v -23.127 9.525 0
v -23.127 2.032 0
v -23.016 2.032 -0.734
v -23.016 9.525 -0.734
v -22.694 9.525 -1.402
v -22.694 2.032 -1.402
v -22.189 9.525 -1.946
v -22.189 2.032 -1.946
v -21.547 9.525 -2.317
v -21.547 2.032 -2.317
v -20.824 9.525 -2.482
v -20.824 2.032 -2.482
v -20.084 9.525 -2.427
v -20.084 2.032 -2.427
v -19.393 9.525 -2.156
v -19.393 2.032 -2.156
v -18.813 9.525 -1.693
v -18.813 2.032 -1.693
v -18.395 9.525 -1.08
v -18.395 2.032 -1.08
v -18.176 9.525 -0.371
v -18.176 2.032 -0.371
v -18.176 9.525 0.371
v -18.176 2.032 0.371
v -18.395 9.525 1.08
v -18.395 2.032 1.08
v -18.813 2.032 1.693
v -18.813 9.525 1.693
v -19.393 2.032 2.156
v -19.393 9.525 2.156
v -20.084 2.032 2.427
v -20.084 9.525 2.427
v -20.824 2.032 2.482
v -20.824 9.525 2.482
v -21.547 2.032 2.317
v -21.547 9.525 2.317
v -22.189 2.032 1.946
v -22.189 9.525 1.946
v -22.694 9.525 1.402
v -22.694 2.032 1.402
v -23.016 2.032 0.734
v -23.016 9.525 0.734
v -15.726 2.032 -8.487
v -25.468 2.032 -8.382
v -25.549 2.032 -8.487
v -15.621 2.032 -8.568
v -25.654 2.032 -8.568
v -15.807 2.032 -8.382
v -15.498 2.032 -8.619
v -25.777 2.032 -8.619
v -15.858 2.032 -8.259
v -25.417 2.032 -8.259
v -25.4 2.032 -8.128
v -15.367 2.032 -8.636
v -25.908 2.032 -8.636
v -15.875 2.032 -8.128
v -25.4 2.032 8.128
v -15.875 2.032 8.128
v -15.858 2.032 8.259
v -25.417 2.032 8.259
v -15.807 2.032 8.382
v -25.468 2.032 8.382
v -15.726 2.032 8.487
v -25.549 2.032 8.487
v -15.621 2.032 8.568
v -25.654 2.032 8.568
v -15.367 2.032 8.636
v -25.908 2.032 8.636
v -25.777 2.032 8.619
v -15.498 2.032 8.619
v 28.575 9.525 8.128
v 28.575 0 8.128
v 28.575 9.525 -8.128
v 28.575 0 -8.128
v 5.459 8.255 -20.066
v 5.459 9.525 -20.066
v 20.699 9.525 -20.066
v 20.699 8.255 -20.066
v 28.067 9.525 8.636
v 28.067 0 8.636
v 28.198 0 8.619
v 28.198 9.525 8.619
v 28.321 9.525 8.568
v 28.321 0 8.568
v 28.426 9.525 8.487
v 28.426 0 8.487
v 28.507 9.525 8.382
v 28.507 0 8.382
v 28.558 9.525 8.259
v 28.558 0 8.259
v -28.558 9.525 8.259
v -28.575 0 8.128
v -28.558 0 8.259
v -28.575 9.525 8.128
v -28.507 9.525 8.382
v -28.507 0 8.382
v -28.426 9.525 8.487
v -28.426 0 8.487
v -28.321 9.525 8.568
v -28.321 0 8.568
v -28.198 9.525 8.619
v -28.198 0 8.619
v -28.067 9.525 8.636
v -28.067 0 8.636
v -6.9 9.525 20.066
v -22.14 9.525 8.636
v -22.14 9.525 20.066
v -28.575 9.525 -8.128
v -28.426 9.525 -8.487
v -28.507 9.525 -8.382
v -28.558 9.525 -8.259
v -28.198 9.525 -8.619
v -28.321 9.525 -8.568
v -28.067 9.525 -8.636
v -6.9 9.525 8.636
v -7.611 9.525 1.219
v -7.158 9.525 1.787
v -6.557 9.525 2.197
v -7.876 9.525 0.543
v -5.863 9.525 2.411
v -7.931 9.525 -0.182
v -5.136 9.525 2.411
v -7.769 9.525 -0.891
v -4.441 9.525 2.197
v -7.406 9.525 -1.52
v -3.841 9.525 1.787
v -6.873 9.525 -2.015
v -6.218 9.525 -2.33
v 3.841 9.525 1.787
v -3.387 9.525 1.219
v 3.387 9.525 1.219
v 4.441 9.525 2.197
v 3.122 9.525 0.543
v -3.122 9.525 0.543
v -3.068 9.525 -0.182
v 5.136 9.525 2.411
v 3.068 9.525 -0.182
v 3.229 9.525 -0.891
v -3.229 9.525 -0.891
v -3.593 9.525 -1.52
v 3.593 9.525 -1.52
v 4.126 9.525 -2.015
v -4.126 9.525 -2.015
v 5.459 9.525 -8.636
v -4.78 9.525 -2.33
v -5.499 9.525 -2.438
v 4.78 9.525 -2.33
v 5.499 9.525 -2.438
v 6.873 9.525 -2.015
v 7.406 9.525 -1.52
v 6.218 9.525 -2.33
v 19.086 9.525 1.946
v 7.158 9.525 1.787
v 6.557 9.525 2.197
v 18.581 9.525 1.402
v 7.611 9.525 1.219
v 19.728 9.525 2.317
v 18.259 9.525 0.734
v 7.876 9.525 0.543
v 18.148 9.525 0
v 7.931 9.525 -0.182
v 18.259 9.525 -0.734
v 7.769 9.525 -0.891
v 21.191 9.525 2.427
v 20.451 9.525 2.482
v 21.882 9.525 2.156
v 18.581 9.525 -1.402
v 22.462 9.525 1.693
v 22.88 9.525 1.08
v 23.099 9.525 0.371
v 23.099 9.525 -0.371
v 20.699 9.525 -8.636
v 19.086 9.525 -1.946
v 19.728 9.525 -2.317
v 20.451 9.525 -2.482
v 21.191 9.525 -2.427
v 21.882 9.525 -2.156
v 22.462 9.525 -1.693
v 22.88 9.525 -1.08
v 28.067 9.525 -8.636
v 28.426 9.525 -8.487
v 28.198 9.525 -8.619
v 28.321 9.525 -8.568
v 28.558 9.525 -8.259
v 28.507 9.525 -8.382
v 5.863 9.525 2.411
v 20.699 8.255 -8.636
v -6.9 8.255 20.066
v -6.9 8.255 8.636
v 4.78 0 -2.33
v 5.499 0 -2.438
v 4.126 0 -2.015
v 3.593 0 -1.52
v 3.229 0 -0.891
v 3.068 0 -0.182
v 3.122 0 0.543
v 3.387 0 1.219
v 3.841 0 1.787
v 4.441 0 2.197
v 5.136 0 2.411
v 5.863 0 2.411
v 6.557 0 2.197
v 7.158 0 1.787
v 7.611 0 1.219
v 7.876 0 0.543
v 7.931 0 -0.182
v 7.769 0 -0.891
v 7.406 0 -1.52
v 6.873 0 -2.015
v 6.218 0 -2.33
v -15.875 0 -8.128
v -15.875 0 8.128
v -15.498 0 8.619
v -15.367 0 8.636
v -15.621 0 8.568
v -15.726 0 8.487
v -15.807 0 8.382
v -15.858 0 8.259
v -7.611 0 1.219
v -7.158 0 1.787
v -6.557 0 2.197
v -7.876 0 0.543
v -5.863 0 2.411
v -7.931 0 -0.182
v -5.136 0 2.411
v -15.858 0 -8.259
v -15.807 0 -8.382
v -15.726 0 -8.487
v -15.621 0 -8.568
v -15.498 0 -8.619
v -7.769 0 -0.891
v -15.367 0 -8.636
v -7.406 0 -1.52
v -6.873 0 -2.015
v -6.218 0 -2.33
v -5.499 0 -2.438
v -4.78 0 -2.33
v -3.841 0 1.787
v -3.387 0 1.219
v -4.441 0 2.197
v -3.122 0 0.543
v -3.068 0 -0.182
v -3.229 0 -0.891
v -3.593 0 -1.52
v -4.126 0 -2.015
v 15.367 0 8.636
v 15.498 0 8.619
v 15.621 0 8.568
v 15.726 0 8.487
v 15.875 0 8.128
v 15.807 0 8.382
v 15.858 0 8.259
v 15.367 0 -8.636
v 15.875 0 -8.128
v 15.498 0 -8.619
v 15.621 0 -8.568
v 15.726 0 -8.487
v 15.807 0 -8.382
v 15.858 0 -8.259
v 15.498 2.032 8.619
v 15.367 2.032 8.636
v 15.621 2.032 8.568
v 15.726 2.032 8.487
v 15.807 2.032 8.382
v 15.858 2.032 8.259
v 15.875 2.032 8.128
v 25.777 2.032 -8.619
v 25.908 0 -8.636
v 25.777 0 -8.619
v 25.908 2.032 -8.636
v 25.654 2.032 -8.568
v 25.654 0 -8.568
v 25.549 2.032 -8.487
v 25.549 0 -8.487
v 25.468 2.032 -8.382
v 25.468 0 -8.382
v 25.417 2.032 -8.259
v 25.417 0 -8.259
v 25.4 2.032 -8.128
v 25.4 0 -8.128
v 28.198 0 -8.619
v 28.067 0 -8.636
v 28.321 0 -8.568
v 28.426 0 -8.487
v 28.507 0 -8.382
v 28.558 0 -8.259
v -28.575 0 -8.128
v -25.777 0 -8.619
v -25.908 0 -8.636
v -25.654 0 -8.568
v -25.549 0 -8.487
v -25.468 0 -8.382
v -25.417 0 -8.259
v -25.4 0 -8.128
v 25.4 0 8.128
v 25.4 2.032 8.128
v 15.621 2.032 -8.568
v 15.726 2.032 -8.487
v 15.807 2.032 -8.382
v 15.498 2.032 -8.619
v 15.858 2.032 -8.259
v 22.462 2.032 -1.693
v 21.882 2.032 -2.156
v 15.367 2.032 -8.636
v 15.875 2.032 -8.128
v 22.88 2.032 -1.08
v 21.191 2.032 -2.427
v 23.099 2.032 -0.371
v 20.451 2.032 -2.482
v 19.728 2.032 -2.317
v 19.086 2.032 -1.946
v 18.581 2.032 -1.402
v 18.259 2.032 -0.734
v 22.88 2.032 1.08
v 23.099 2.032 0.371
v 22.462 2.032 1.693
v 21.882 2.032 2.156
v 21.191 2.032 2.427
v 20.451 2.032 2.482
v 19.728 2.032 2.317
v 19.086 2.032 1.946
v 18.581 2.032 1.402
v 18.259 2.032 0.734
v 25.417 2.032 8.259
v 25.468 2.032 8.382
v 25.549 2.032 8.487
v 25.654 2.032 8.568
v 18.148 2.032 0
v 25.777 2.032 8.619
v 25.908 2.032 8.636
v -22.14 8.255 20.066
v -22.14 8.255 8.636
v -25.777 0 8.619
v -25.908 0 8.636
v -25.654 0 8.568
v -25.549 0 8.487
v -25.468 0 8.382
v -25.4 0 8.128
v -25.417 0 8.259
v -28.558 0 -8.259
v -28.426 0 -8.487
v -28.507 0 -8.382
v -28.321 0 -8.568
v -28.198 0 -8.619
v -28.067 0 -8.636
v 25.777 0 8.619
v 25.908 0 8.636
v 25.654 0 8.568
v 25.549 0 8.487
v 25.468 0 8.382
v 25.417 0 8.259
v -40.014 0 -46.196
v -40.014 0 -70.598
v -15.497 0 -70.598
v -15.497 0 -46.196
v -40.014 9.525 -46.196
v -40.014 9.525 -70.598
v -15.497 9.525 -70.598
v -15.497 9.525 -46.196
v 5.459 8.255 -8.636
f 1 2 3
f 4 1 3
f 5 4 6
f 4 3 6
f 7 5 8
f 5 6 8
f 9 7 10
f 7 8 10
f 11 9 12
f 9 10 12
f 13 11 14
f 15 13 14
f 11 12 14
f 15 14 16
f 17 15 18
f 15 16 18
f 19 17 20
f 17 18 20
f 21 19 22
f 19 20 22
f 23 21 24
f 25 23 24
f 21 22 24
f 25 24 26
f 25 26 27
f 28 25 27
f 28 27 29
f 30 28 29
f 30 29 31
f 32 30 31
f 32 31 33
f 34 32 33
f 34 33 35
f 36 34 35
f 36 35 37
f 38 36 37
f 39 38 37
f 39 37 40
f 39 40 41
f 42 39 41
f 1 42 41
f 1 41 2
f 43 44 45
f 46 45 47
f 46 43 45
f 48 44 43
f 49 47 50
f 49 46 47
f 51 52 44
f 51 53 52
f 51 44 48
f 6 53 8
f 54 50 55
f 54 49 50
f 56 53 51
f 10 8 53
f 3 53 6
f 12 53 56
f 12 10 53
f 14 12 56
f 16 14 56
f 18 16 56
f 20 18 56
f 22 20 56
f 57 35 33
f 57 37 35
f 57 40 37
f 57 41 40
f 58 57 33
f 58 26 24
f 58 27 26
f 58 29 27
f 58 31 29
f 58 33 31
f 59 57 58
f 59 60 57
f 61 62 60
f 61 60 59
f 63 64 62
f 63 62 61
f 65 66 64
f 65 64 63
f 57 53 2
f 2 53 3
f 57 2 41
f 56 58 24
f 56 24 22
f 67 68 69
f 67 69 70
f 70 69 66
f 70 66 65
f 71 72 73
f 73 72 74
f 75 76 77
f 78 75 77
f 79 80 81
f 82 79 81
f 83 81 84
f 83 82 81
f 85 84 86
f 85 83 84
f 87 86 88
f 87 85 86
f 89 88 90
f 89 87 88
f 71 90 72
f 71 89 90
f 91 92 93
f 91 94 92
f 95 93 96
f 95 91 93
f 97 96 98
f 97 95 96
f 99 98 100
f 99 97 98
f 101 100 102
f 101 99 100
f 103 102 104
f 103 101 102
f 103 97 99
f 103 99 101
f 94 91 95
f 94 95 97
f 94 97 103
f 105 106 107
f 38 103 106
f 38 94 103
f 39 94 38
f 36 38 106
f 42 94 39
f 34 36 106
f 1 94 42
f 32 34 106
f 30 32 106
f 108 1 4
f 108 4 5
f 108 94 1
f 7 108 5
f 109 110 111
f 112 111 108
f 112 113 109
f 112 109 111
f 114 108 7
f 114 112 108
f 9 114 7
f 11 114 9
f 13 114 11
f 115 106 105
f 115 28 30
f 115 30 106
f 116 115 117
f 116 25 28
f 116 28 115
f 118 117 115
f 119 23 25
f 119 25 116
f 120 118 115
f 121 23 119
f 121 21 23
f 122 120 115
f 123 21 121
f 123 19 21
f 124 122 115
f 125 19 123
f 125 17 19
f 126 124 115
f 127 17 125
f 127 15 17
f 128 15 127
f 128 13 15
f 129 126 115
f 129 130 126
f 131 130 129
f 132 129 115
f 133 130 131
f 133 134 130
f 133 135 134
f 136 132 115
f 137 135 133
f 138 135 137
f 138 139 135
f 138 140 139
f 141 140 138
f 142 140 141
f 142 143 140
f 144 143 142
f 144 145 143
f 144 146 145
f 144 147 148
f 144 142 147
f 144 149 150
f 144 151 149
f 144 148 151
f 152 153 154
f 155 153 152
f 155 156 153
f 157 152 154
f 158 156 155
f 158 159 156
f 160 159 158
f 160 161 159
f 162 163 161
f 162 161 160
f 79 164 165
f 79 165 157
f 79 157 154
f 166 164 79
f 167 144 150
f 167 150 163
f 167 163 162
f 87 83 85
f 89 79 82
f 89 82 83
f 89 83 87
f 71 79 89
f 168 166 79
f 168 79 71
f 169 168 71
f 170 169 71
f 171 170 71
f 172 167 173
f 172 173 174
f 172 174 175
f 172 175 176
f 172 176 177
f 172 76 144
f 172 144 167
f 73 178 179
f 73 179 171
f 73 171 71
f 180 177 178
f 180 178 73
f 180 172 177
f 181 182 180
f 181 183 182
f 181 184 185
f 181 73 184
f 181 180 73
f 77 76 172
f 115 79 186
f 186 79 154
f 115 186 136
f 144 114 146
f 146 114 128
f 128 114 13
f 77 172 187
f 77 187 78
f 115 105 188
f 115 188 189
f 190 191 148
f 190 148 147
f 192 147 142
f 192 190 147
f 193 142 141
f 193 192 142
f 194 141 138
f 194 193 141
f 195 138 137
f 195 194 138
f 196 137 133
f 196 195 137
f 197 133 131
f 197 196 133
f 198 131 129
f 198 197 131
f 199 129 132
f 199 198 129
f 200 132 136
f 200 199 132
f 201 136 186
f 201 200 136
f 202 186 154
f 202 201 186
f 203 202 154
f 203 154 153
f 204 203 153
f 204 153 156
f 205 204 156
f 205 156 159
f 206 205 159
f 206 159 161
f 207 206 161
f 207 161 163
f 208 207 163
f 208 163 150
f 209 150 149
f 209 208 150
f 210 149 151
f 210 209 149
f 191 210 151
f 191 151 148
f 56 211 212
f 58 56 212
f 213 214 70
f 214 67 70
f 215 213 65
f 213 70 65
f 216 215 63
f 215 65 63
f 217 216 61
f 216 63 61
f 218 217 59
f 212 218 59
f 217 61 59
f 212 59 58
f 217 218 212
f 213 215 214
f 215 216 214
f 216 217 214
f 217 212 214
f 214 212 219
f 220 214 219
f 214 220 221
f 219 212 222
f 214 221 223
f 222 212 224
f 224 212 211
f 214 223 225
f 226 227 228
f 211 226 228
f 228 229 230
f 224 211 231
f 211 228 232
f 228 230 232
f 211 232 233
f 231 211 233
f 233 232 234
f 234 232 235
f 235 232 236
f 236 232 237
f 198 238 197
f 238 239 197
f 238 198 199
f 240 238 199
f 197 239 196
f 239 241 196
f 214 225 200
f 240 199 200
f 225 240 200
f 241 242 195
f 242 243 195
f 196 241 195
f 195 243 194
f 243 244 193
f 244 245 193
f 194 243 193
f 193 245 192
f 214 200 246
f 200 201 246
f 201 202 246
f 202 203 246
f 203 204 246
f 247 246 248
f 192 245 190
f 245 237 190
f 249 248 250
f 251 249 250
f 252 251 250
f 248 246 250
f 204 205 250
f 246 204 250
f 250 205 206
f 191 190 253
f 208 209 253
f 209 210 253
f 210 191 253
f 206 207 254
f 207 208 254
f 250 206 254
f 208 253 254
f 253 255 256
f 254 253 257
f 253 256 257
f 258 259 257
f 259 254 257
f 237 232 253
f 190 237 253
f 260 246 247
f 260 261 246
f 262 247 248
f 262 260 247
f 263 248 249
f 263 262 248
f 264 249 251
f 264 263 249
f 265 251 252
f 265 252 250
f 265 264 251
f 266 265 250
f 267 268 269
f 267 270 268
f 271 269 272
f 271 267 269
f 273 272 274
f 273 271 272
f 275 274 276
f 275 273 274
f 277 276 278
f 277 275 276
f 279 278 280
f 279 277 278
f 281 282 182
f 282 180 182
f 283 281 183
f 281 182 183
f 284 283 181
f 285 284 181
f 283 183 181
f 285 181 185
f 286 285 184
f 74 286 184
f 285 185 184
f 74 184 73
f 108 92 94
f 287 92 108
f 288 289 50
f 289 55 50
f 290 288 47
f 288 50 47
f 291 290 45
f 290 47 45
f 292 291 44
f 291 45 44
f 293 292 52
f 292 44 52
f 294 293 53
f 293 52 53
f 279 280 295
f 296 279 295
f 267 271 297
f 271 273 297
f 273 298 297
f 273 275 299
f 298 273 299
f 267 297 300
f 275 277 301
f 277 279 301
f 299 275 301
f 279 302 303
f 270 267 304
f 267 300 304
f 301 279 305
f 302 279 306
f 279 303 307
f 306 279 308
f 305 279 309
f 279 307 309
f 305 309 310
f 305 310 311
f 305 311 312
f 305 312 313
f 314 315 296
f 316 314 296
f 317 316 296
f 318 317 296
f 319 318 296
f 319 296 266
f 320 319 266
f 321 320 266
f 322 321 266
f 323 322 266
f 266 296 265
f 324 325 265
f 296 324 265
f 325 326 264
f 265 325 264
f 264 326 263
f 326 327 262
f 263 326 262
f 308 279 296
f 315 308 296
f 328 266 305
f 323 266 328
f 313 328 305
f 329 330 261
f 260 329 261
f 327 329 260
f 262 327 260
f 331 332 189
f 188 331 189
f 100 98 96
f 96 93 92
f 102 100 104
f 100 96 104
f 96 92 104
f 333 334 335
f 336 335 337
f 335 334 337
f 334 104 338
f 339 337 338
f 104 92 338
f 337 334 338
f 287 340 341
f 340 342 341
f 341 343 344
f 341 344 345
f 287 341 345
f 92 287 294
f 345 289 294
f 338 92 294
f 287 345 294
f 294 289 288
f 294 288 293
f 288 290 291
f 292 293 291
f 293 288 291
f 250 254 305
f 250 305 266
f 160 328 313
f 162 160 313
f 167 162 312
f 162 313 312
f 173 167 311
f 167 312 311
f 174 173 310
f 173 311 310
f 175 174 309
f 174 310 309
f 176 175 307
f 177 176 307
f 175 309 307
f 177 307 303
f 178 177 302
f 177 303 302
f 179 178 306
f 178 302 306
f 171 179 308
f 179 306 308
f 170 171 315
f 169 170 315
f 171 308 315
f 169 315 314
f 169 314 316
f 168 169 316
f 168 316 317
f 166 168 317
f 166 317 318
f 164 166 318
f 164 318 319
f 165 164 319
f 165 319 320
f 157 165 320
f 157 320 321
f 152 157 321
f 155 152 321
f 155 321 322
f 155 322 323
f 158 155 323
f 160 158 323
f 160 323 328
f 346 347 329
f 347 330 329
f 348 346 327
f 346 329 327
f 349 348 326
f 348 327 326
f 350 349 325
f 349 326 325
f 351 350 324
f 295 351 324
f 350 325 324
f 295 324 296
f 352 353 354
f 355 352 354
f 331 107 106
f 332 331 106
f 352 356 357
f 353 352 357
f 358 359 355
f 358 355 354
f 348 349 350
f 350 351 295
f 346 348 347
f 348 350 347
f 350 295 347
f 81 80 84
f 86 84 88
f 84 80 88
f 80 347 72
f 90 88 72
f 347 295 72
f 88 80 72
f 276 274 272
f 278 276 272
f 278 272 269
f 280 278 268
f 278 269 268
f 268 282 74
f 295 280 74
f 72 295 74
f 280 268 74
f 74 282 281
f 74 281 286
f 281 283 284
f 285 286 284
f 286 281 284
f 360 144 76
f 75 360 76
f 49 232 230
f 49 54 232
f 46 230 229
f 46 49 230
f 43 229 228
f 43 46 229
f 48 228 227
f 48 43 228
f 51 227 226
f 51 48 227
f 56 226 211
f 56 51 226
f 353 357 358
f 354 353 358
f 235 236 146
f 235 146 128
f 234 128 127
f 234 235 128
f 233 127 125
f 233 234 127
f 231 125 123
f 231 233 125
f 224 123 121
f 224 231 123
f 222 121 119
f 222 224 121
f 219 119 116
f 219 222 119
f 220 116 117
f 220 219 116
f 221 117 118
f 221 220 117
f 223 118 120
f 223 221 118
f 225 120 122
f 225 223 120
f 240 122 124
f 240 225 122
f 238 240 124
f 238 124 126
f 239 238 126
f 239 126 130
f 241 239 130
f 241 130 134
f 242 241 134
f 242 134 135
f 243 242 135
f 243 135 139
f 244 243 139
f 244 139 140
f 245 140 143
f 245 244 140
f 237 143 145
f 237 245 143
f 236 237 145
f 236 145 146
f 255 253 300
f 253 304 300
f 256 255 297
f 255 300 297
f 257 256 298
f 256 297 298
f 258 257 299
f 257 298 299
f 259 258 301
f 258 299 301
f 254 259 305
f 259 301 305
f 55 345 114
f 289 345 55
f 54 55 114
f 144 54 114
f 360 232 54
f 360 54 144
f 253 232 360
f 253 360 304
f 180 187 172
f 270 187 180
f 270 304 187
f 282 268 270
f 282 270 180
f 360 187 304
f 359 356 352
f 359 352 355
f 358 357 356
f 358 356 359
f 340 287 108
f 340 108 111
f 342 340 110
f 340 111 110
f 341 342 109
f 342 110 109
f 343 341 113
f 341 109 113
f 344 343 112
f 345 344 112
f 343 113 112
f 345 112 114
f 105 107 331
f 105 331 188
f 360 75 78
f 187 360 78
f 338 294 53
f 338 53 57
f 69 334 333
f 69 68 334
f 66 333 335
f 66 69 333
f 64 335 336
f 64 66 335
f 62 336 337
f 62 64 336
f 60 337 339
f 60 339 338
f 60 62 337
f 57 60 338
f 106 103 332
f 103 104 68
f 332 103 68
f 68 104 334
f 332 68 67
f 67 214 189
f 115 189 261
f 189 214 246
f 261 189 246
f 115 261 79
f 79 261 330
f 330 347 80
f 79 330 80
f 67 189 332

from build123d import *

# Parameters (mm, degrees)
SKETCH1_W              = 57.15
SKETCH1_H              = 17.272
SKETCH1_R              = 2.4384
BOSS_EXTRUDE1_DEPTH    = 9.525
F_10_CLEARANCE_HOLE1_D = 4.9784
SKETCH4_W              = 9.525
SKETCH4_H              = 17.272
CUT_EXTRUDE1_DEPTH     = 2.032
FILLET1_R              = 0.508
SKETCH5_W              = 24.516541507
SKETCH5_H              = 24.401843065
BOSS_EXTRUDE2_DEPTH    = 9.525
SKETCH6_W              = 15.24
SKETCH6_H              = 11.43
BOSS_EXTRUDE3_DEPTH    = 1.27


with BuildPart() as part:
    # Sketch1 → Boss-Extrude1 (new body)
    with BuildSketch(Plane(origin=(0, 0, 0), x_dir=(1, 0, 0), z_dir=(0, 1, 0))):
        Rectangle(SKETCH1_W, SKETCH1_H)
        with Locations(Location((-5.4991, 0, 0), (0, 0, 90))):
            Circle(SKETCH1_R, mode=Mode.SUBTRACT)
        with Locations(Location((5.4991, 0, 0), (0, 0, 90))):
            Circle(SKETCH1_R, mode=Mode.SUBTRACT)
    extrude(amount=BOSS_EXTRUDE1_DEPTH)

    # #10 Clearance Hole1 (through all)
    with Locations(Plane(origin=(0, 9.525, 0), x_dir=(1, 0, 0), z_dir=(0, 1, 0))):
        with Locations((-20.6375, 0), (20.6375, 0)):
            Hole(F_10_CLEARANCE_HOLE1_D / 2)

    # Sketch4 → Cut-Extrude1 (cut)
    with BuildSketch(Plane.XZ):
        with Locations((-20.6375, 0)):
            Rectangle(SKETCH4_W, SKETCH4_H)
    cut_extrude1 = extrude(amount=-CUT_EXTRUDE1_DEPTH, mode=Mode.SUBTRACT)

    # Mirror1: Cut-Extrude1 across plane
    add(cut_extrude1.mirror(Plane(origin=(0, 0, 0), x_dir=(0, 0, 1), z_dir=(1, 0, 0))), mode=Mode.SUBTRACT)

    # Fillet1
    fillet1_edges = [part.edges().sort_by_distance(p)[0] for p in [
        (-15.875, 1.016, -8.636),
        (-25.4, 1.016, -8.636),
        (-25.4, 1.016, 8.636),
        (-15.875, 1.016, 8.636),
        (25.4, 1.016, -8.636),
        (15.875, 1.016, -8.636),
        (15.875, 1.016, 8.636),
        (25.4, 1.016, 8.636),
        (28.575, 4.7625, -8.636),
        (28.575, 4.7625, 8.636),
        (-28.575, 4.7625, 8.636),
        (-28.575, 4.7625, -8.636),
    ]]
    fillet(fillet1_edges, radius=FILLET1_R)

    # Sketch6 → Boss-Extrude3 (add)
    with BuildSketch(Plane(origin=(0, 9.525, 0), x_dir=(1, 0, 0), z_dir=(0, 1, 0))):
        with Locations((13.079142729, 14.351)):
            Rectangle(SKETCH6_W, SKETCH6_H)
        with Locations((-14.520274695, -14.351)):
            Rectangle(SKETCH6_W, SKETCH6_H)
    extrude(amount=-BOSS_EXTRUDE3_DEPTH)


with BuildPart() as body_2:
    # Sketch5 → Boss-Extrude2 (new body)
    with BuildSketch(Plane(origin=(0, 9.525, 0), x_dir=(1, 0, 0), z_dir=(0, 1, 0))):
        with Locations((-27.755611122, 58.397000049)):
            Rectangle(SKETCH5_W, SKETCH5_H)
    extrude(amount=-BOSS_EXTRUDE2_DEPTH)


solid = Compound([part.part, body_2.part])
